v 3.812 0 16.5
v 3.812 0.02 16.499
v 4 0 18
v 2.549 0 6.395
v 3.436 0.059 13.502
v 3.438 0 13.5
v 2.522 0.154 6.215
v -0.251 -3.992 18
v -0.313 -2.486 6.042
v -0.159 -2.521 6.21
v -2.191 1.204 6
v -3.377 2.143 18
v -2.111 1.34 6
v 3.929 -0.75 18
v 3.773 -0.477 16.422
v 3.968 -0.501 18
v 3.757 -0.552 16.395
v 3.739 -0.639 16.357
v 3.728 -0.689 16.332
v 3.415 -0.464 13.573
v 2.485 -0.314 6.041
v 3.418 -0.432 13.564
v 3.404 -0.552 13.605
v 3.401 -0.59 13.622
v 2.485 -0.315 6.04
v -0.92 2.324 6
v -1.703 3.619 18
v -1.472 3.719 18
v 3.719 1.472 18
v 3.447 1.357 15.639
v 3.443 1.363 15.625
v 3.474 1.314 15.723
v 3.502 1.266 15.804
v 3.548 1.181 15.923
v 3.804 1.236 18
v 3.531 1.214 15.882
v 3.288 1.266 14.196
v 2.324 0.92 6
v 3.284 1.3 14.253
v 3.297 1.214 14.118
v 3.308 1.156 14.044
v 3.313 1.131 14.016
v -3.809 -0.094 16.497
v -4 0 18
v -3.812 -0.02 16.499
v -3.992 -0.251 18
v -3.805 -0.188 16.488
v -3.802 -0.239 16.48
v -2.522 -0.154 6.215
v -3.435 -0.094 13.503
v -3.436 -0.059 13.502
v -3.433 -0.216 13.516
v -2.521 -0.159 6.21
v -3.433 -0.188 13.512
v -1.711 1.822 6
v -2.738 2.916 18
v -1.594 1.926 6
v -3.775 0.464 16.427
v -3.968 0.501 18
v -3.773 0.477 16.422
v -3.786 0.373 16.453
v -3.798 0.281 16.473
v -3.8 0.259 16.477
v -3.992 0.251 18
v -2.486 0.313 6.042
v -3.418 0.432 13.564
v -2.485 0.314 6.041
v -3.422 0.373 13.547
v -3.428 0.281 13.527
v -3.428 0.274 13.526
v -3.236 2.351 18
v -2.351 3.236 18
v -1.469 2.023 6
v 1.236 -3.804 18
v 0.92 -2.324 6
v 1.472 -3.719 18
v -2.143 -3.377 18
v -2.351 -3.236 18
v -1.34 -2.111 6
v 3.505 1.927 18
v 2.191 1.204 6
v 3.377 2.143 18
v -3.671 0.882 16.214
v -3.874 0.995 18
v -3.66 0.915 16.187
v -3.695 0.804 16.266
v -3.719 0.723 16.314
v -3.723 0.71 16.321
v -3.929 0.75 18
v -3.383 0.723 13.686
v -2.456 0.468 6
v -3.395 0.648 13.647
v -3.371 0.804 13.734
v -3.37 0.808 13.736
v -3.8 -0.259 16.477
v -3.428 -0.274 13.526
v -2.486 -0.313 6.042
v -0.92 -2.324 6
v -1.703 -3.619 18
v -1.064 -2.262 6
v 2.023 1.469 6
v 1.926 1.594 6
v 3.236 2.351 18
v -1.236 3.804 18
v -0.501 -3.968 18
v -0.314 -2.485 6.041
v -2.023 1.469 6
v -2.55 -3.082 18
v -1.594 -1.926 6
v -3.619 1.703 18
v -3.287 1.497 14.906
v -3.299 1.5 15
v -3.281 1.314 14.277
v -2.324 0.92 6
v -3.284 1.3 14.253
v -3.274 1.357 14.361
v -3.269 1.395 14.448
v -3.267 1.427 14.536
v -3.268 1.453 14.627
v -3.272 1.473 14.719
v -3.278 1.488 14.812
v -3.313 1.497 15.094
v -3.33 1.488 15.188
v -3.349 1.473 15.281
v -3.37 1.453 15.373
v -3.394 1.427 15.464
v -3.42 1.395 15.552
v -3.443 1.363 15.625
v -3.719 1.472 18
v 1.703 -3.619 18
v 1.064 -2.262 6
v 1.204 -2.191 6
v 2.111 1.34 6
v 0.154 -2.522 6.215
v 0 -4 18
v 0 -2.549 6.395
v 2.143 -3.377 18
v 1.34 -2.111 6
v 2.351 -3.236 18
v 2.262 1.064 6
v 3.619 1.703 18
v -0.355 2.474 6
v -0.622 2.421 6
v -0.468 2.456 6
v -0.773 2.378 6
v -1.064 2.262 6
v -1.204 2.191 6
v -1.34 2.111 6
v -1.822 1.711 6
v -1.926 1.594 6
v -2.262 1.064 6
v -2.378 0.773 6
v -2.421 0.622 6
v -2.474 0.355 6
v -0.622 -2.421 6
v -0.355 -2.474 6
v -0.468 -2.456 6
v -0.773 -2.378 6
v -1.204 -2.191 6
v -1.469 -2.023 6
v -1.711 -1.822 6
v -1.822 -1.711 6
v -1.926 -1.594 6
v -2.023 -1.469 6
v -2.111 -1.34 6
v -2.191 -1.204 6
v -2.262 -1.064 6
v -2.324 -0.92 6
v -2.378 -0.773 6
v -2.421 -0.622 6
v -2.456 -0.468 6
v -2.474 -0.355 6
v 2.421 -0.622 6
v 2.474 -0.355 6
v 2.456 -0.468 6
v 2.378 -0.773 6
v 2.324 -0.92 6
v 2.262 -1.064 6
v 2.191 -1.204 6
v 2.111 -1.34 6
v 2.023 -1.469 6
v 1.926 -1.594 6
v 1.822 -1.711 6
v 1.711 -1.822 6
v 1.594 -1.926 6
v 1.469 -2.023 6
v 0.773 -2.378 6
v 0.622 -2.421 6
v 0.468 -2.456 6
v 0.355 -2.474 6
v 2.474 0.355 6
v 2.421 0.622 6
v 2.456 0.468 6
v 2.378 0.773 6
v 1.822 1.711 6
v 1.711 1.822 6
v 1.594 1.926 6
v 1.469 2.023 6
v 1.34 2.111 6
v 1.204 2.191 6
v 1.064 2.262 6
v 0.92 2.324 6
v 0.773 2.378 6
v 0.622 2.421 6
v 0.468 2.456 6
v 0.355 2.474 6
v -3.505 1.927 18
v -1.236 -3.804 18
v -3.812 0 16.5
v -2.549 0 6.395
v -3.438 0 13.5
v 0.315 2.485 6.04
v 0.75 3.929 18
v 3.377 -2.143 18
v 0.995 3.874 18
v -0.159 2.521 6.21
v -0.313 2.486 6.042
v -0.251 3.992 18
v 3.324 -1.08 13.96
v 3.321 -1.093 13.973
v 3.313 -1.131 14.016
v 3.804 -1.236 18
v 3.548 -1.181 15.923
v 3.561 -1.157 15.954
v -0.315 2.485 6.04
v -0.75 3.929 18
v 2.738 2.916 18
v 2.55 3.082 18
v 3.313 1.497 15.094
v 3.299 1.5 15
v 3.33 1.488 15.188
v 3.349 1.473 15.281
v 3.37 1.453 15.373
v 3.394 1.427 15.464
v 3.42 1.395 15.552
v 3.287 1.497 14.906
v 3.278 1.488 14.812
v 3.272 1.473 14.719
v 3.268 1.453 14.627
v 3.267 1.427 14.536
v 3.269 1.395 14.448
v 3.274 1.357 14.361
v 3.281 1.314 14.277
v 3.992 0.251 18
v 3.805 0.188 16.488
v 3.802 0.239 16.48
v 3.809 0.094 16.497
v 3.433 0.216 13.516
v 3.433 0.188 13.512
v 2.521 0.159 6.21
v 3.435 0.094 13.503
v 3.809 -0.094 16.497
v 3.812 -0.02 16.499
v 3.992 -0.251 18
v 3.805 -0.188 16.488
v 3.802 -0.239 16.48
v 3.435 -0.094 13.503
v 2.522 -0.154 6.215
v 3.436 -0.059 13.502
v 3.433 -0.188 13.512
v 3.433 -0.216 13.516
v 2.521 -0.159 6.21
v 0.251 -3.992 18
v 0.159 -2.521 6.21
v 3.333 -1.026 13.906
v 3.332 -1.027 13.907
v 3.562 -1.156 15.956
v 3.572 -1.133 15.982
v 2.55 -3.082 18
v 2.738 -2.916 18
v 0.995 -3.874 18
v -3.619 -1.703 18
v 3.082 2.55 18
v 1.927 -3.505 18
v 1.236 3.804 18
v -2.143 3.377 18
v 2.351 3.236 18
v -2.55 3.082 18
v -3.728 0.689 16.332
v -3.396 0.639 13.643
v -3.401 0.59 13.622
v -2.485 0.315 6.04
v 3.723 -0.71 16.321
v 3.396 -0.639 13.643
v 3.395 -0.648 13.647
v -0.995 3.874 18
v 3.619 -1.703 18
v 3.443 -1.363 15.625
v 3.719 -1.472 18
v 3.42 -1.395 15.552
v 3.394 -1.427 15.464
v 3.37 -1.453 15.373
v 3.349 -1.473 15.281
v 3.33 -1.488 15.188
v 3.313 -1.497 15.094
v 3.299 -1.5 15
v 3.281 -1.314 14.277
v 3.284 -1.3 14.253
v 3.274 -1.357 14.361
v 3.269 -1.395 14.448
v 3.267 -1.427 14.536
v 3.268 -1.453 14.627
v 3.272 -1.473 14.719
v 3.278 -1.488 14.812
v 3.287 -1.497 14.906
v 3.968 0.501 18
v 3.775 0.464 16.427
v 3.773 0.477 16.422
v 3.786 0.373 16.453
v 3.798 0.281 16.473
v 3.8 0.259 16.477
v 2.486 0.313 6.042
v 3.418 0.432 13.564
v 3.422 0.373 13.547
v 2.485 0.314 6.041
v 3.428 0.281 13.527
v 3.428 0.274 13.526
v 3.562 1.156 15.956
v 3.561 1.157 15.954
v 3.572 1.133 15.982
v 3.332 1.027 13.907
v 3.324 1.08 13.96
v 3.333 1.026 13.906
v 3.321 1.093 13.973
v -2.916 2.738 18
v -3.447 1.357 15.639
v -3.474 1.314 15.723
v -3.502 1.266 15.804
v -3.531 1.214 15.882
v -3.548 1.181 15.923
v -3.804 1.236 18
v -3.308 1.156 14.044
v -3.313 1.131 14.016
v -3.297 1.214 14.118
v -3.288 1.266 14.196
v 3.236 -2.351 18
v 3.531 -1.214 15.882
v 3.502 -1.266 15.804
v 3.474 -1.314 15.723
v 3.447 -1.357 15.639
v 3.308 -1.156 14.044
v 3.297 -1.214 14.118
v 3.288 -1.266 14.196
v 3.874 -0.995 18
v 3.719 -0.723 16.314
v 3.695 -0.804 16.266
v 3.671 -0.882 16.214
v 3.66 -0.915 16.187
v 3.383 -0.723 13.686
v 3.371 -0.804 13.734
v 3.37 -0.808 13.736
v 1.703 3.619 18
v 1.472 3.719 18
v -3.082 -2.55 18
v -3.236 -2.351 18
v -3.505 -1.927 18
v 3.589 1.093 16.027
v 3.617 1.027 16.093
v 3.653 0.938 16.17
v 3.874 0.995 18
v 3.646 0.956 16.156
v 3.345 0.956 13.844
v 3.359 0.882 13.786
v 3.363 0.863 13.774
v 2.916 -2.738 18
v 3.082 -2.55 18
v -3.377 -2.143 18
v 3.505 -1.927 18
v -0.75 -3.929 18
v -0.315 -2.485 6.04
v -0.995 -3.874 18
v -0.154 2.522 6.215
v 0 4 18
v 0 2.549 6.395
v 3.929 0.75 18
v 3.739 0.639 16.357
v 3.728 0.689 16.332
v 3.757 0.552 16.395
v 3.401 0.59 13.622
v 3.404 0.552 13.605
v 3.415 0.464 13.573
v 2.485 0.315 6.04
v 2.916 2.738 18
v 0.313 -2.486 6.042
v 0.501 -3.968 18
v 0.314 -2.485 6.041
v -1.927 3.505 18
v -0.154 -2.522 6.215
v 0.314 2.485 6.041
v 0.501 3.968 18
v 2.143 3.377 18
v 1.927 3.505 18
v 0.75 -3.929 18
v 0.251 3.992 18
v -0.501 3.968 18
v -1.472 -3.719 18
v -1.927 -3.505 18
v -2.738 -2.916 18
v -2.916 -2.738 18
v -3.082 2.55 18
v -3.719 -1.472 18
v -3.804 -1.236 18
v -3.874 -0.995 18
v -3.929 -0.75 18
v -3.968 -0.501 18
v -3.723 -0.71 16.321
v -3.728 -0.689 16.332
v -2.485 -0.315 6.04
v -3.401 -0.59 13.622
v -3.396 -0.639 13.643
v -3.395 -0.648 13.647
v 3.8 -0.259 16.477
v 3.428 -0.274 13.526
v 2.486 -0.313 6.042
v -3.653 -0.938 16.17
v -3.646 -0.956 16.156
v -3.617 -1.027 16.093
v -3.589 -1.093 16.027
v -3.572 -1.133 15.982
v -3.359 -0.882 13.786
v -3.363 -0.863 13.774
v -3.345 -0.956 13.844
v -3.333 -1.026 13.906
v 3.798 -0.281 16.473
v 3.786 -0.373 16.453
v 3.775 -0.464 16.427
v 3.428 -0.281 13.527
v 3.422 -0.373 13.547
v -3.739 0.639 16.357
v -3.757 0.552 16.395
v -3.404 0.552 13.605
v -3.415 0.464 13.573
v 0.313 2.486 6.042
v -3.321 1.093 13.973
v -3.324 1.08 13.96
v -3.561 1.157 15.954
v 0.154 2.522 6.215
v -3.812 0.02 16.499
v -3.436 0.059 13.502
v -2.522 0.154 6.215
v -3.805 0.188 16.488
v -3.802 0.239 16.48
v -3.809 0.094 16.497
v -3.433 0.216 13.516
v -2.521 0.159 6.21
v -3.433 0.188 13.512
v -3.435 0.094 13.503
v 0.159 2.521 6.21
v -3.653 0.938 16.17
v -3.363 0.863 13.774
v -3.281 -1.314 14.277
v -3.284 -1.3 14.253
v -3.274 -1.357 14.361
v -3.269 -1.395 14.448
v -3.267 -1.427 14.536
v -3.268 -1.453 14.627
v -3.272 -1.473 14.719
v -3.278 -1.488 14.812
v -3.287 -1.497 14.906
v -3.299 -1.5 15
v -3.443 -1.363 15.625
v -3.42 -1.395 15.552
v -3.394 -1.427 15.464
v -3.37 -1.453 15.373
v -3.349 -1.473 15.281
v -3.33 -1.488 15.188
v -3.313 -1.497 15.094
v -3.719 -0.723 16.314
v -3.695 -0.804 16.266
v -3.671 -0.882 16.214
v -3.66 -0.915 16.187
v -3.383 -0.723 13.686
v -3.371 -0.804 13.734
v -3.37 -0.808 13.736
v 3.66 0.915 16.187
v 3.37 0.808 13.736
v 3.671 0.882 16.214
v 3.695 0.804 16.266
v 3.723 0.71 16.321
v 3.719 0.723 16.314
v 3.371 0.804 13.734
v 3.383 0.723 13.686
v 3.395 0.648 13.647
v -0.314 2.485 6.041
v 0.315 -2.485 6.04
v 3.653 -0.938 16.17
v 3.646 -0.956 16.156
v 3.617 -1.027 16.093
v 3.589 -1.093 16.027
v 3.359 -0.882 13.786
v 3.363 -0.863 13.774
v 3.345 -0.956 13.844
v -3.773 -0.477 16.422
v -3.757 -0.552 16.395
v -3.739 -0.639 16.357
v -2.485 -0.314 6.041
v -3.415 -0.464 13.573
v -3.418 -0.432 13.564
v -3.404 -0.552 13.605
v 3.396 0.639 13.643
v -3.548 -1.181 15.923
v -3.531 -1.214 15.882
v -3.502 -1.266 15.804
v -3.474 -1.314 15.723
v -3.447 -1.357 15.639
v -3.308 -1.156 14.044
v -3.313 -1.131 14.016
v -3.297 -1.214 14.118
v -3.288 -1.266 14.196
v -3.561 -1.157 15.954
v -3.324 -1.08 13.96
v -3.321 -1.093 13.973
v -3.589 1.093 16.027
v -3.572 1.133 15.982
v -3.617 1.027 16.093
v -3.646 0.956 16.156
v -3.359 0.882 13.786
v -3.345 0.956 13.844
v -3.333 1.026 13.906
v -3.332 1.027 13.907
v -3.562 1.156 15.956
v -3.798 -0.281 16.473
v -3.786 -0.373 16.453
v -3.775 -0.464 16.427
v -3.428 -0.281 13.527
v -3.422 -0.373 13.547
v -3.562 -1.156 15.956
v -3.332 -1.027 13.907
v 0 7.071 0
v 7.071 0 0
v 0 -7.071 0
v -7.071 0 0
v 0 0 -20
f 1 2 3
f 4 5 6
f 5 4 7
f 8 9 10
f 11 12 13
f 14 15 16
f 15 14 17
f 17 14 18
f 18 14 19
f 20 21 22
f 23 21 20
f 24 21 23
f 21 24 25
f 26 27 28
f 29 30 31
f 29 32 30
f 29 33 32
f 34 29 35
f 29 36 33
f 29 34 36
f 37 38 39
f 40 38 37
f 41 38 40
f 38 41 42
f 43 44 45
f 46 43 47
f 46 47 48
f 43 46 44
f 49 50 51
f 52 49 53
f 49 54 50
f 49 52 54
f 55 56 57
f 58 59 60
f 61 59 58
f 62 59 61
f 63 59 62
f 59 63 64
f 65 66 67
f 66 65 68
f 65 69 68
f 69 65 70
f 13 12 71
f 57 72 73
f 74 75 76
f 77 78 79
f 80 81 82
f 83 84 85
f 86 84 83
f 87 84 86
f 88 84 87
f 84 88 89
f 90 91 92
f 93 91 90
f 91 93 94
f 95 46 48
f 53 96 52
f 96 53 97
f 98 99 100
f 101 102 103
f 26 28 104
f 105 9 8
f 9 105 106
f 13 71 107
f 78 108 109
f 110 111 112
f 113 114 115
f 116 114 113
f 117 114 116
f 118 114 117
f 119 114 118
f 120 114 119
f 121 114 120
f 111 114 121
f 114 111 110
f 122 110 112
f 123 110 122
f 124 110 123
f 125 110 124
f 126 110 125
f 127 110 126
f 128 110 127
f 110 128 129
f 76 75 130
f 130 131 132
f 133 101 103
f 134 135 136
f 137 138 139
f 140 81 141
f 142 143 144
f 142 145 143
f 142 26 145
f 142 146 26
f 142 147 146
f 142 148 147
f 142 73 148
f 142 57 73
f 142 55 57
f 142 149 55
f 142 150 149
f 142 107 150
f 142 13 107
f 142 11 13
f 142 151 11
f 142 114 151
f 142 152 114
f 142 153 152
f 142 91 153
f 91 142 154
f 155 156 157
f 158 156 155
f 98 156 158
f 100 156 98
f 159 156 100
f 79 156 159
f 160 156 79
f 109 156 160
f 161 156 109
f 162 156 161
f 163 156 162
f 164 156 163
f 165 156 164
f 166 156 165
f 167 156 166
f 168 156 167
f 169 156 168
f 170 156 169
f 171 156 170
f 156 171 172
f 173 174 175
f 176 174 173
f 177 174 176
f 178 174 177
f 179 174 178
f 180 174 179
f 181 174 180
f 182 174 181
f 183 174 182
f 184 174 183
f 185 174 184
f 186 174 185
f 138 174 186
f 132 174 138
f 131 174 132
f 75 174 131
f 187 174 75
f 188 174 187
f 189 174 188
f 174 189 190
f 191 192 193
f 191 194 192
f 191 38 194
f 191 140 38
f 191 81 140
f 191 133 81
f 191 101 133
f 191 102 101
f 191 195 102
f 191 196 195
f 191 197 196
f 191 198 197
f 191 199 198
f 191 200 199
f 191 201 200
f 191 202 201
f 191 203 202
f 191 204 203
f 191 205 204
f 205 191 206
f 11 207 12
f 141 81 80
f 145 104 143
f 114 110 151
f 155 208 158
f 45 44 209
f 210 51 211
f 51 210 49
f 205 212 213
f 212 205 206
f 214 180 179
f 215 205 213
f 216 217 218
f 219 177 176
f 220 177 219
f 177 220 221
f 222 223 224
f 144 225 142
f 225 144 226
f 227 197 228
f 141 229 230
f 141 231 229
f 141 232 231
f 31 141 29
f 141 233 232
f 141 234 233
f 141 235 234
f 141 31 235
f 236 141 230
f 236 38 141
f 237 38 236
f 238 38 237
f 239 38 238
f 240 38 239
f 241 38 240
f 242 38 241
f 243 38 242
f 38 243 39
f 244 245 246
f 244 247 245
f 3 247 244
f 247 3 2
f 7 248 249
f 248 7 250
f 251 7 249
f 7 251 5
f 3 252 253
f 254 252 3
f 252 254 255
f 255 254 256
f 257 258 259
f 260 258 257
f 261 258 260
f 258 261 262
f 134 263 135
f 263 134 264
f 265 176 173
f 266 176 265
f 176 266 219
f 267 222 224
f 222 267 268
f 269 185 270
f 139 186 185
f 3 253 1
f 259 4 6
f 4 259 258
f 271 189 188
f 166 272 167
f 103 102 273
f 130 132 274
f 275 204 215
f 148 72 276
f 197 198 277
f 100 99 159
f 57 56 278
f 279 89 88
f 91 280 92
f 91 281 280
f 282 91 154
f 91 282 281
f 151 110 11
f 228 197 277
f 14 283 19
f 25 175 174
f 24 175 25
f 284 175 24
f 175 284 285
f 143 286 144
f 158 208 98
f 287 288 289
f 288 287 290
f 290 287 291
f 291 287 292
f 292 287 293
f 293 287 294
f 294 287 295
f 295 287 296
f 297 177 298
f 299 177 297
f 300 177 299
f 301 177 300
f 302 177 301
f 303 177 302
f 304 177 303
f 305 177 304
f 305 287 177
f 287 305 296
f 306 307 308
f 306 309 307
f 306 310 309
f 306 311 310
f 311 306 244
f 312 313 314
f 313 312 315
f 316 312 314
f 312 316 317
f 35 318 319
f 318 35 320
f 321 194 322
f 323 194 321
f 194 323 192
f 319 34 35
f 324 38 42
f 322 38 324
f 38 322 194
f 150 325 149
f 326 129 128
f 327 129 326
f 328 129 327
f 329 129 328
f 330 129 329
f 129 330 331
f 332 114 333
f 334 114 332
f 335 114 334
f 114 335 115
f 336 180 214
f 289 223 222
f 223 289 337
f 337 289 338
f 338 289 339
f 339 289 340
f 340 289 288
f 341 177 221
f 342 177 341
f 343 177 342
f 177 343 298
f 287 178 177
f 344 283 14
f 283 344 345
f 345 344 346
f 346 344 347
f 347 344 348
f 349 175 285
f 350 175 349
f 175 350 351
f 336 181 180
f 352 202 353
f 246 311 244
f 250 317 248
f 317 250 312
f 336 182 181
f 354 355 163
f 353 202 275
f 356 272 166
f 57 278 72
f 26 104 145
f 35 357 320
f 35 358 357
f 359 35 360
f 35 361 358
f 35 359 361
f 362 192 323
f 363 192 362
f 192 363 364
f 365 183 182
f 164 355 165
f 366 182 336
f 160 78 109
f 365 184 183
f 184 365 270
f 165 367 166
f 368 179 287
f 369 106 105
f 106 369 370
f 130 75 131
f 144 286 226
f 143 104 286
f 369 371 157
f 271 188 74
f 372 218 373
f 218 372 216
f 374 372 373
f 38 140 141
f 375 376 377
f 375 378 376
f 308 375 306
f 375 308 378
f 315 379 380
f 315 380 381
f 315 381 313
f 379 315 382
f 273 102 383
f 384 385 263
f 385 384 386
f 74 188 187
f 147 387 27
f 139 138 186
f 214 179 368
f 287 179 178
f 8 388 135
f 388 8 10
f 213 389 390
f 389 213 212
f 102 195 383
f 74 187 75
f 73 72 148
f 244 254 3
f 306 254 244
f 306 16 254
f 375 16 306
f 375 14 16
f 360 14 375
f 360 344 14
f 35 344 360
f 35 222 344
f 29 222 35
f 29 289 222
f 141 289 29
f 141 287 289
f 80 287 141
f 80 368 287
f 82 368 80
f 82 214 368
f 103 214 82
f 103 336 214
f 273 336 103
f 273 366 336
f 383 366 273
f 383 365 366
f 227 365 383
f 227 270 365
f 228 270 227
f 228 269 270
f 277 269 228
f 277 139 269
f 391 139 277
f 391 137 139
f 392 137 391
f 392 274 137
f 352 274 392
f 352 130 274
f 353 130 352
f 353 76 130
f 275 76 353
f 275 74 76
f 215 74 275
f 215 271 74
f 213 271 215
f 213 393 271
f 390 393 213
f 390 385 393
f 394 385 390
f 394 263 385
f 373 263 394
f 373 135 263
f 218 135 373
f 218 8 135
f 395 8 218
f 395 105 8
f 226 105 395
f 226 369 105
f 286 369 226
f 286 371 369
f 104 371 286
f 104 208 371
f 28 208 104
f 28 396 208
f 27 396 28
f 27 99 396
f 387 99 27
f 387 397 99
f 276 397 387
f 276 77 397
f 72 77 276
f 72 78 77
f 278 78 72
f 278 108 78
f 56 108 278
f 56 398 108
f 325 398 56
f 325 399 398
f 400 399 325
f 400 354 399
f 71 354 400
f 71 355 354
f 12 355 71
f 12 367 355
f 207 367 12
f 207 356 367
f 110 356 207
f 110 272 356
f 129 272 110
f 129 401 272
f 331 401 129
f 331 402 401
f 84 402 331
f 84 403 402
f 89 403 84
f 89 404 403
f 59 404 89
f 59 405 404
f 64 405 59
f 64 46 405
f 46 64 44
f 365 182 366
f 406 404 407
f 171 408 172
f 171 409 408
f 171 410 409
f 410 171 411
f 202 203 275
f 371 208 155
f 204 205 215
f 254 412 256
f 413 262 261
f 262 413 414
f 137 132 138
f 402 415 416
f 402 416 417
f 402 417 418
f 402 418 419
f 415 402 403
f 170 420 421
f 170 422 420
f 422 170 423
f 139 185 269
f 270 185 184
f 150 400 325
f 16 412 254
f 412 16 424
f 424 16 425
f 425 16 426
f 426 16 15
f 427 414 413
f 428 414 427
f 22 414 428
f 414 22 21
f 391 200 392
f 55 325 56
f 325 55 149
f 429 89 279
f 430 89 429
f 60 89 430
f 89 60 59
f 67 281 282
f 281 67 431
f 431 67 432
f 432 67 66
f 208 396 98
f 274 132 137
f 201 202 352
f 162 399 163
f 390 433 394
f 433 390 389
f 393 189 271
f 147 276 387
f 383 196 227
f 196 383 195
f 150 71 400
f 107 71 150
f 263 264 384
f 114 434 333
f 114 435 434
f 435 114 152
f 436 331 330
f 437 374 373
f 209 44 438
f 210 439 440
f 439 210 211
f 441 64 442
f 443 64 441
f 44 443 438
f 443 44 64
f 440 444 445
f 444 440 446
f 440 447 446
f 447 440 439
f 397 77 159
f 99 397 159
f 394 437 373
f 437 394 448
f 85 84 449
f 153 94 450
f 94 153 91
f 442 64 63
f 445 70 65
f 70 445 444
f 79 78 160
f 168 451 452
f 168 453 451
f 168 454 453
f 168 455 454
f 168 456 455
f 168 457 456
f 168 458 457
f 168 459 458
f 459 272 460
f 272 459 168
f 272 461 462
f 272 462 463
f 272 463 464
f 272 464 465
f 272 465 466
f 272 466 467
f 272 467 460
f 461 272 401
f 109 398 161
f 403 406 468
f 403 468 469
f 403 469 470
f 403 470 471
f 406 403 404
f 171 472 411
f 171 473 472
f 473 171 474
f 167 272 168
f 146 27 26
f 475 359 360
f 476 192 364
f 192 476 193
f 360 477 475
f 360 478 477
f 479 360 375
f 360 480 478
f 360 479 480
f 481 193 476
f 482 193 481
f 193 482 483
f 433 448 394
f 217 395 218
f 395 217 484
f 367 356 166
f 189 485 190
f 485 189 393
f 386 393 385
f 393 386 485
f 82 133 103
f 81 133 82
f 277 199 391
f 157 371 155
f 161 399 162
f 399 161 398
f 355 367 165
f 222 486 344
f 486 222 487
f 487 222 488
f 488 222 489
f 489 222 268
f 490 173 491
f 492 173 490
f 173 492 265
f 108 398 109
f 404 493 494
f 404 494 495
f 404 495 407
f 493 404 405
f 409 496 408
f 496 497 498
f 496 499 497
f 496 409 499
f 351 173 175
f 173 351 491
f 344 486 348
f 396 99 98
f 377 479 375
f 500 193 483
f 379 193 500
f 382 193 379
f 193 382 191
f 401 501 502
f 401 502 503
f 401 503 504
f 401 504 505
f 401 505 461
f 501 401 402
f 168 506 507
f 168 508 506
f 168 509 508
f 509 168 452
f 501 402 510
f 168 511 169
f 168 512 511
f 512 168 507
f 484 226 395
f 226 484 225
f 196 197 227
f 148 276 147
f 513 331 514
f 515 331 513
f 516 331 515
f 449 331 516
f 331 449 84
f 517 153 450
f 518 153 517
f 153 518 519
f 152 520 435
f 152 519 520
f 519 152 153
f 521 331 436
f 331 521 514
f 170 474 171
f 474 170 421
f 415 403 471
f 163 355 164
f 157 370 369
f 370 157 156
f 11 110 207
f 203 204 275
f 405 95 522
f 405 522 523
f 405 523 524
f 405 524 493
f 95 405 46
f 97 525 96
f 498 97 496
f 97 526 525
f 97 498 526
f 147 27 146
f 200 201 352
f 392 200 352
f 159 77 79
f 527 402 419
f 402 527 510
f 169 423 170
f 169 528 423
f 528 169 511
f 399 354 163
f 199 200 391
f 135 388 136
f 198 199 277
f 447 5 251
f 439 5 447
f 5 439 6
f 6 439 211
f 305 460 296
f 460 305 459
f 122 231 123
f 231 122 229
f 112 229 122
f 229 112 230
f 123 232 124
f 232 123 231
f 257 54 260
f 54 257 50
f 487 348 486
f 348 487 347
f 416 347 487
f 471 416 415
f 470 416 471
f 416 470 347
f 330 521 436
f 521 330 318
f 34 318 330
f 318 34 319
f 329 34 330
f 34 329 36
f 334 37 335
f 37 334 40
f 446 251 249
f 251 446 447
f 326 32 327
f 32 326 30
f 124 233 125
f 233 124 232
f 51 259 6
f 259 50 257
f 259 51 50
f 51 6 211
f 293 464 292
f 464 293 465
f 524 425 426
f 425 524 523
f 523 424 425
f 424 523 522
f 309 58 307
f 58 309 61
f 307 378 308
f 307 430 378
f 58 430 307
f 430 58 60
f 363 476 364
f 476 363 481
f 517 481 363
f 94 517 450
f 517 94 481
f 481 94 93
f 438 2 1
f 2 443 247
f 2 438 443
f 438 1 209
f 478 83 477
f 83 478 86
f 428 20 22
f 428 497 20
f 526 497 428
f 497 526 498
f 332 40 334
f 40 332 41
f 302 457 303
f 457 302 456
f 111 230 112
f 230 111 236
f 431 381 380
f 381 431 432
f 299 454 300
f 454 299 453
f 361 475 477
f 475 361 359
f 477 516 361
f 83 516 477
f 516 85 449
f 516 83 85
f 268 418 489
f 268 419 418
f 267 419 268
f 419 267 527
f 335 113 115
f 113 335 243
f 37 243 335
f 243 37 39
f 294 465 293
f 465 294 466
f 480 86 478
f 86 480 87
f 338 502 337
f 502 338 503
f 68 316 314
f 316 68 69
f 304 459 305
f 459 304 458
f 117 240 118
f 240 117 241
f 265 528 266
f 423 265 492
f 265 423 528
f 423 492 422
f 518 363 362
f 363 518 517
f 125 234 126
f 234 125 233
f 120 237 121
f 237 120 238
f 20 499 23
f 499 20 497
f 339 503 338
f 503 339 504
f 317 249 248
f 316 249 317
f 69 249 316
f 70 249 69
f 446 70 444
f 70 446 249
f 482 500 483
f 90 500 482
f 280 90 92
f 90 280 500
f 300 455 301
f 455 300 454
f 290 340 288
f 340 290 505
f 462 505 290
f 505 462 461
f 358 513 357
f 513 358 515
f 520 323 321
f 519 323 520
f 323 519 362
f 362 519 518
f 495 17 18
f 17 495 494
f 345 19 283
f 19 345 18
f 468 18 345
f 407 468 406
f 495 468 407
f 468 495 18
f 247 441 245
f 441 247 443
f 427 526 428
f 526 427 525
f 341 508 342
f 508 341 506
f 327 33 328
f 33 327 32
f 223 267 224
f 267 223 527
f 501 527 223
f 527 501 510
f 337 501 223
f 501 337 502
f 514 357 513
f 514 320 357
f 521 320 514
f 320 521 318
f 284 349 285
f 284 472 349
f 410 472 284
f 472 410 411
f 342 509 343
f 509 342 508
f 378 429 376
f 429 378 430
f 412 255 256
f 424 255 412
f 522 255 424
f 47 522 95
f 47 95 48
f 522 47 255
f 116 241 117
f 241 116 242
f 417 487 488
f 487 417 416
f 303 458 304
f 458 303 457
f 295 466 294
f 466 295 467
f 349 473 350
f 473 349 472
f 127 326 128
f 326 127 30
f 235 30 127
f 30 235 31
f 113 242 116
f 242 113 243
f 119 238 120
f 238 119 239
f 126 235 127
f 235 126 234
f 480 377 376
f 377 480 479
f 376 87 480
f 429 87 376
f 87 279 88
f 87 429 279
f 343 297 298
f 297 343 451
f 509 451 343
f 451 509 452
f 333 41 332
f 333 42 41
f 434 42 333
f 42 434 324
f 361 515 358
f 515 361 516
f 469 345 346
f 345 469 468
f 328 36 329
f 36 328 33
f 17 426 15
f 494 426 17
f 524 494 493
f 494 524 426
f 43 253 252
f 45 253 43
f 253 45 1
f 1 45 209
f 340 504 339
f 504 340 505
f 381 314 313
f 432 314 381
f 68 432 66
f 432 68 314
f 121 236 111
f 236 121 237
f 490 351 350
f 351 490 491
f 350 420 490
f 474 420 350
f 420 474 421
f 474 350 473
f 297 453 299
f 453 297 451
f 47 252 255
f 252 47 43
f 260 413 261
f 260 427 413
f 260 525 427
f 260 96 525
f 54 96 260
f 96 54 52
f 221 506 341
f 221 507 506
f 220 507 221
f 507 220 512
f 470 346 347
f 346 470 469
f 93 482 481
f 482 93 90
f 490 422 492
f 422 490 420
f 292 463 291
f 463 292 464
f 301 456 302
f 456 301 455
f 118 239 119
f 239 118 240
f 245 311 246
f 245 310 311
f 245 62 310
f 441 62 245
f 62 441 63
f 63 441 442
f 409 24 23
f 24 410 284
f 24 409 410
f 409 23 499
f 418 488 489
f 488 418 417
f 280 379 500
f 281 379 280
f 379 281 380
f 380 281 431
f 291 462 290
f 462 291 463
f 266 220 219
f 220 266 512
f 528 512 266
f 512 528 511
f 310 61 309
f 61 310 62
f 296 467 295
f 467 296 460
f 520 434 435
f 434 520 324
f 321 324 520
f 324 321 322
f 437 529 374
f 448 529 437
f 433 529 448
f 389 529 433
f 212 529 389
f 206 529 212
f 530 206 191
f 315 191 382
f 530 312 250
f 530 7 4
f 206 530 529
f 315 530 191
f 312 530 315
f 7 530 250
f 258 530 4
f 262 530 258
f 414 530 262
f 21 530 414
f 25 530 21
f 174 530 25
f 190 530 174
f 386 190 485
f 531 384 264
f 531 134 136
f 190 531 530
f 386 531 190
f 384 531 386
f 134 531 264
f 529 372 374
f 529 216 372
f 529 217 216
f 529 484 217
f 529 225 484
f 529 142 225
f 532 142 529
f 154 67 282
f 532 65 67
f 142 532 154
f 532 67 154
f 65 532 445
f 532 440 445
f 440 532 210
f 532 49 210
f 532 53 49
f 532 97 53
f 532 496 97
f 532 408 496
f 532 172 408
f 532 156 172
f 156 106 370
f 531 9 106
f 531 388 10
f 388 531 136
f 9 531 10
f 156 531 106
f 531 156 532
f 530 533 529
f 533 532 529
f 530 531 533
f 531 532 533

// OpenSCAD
//Loguncov Maxim

hole_size = 1.5; 
difference() {
   translate([0,0,12])
	cylinder(12,2.5,4, center = true, $fn=100);

	translate([0,0,15]) 
	rotate([90,0,90])
      cylinder (10, hole_size,hole_size, center = true, $fn=100);
}



apex_point_top_pyramid = 10; 
rotate(a=[0,0,45])
polyhedron(
  points=[ [5,5,0],[5,-5,0],[-5,-5,0],[-5,5,0], 
           [0,0,apex_point_top_pyramid]  ],                                 
  triangles=[ [0,1,4],[1,2,4],[2,3,4],[3,0,4],       
              [1,0,3],[2,1,3] ]                       
 );


apex_point_bottom_pyramid = 20;
rotate(a=[180,0,45])
polyhedron(
  points=[ [5,5,0],[5,-5,0],[-5,-5,0],[-5,5,0], 
           [0,0,apex_point_bottom_pyramid]  ],                                 
  triangles=[ [0,1,4],[1,2,4],[2,3,4],[3,0,4],      
              [1,0,3],[2,1,3] ]                   
 );
